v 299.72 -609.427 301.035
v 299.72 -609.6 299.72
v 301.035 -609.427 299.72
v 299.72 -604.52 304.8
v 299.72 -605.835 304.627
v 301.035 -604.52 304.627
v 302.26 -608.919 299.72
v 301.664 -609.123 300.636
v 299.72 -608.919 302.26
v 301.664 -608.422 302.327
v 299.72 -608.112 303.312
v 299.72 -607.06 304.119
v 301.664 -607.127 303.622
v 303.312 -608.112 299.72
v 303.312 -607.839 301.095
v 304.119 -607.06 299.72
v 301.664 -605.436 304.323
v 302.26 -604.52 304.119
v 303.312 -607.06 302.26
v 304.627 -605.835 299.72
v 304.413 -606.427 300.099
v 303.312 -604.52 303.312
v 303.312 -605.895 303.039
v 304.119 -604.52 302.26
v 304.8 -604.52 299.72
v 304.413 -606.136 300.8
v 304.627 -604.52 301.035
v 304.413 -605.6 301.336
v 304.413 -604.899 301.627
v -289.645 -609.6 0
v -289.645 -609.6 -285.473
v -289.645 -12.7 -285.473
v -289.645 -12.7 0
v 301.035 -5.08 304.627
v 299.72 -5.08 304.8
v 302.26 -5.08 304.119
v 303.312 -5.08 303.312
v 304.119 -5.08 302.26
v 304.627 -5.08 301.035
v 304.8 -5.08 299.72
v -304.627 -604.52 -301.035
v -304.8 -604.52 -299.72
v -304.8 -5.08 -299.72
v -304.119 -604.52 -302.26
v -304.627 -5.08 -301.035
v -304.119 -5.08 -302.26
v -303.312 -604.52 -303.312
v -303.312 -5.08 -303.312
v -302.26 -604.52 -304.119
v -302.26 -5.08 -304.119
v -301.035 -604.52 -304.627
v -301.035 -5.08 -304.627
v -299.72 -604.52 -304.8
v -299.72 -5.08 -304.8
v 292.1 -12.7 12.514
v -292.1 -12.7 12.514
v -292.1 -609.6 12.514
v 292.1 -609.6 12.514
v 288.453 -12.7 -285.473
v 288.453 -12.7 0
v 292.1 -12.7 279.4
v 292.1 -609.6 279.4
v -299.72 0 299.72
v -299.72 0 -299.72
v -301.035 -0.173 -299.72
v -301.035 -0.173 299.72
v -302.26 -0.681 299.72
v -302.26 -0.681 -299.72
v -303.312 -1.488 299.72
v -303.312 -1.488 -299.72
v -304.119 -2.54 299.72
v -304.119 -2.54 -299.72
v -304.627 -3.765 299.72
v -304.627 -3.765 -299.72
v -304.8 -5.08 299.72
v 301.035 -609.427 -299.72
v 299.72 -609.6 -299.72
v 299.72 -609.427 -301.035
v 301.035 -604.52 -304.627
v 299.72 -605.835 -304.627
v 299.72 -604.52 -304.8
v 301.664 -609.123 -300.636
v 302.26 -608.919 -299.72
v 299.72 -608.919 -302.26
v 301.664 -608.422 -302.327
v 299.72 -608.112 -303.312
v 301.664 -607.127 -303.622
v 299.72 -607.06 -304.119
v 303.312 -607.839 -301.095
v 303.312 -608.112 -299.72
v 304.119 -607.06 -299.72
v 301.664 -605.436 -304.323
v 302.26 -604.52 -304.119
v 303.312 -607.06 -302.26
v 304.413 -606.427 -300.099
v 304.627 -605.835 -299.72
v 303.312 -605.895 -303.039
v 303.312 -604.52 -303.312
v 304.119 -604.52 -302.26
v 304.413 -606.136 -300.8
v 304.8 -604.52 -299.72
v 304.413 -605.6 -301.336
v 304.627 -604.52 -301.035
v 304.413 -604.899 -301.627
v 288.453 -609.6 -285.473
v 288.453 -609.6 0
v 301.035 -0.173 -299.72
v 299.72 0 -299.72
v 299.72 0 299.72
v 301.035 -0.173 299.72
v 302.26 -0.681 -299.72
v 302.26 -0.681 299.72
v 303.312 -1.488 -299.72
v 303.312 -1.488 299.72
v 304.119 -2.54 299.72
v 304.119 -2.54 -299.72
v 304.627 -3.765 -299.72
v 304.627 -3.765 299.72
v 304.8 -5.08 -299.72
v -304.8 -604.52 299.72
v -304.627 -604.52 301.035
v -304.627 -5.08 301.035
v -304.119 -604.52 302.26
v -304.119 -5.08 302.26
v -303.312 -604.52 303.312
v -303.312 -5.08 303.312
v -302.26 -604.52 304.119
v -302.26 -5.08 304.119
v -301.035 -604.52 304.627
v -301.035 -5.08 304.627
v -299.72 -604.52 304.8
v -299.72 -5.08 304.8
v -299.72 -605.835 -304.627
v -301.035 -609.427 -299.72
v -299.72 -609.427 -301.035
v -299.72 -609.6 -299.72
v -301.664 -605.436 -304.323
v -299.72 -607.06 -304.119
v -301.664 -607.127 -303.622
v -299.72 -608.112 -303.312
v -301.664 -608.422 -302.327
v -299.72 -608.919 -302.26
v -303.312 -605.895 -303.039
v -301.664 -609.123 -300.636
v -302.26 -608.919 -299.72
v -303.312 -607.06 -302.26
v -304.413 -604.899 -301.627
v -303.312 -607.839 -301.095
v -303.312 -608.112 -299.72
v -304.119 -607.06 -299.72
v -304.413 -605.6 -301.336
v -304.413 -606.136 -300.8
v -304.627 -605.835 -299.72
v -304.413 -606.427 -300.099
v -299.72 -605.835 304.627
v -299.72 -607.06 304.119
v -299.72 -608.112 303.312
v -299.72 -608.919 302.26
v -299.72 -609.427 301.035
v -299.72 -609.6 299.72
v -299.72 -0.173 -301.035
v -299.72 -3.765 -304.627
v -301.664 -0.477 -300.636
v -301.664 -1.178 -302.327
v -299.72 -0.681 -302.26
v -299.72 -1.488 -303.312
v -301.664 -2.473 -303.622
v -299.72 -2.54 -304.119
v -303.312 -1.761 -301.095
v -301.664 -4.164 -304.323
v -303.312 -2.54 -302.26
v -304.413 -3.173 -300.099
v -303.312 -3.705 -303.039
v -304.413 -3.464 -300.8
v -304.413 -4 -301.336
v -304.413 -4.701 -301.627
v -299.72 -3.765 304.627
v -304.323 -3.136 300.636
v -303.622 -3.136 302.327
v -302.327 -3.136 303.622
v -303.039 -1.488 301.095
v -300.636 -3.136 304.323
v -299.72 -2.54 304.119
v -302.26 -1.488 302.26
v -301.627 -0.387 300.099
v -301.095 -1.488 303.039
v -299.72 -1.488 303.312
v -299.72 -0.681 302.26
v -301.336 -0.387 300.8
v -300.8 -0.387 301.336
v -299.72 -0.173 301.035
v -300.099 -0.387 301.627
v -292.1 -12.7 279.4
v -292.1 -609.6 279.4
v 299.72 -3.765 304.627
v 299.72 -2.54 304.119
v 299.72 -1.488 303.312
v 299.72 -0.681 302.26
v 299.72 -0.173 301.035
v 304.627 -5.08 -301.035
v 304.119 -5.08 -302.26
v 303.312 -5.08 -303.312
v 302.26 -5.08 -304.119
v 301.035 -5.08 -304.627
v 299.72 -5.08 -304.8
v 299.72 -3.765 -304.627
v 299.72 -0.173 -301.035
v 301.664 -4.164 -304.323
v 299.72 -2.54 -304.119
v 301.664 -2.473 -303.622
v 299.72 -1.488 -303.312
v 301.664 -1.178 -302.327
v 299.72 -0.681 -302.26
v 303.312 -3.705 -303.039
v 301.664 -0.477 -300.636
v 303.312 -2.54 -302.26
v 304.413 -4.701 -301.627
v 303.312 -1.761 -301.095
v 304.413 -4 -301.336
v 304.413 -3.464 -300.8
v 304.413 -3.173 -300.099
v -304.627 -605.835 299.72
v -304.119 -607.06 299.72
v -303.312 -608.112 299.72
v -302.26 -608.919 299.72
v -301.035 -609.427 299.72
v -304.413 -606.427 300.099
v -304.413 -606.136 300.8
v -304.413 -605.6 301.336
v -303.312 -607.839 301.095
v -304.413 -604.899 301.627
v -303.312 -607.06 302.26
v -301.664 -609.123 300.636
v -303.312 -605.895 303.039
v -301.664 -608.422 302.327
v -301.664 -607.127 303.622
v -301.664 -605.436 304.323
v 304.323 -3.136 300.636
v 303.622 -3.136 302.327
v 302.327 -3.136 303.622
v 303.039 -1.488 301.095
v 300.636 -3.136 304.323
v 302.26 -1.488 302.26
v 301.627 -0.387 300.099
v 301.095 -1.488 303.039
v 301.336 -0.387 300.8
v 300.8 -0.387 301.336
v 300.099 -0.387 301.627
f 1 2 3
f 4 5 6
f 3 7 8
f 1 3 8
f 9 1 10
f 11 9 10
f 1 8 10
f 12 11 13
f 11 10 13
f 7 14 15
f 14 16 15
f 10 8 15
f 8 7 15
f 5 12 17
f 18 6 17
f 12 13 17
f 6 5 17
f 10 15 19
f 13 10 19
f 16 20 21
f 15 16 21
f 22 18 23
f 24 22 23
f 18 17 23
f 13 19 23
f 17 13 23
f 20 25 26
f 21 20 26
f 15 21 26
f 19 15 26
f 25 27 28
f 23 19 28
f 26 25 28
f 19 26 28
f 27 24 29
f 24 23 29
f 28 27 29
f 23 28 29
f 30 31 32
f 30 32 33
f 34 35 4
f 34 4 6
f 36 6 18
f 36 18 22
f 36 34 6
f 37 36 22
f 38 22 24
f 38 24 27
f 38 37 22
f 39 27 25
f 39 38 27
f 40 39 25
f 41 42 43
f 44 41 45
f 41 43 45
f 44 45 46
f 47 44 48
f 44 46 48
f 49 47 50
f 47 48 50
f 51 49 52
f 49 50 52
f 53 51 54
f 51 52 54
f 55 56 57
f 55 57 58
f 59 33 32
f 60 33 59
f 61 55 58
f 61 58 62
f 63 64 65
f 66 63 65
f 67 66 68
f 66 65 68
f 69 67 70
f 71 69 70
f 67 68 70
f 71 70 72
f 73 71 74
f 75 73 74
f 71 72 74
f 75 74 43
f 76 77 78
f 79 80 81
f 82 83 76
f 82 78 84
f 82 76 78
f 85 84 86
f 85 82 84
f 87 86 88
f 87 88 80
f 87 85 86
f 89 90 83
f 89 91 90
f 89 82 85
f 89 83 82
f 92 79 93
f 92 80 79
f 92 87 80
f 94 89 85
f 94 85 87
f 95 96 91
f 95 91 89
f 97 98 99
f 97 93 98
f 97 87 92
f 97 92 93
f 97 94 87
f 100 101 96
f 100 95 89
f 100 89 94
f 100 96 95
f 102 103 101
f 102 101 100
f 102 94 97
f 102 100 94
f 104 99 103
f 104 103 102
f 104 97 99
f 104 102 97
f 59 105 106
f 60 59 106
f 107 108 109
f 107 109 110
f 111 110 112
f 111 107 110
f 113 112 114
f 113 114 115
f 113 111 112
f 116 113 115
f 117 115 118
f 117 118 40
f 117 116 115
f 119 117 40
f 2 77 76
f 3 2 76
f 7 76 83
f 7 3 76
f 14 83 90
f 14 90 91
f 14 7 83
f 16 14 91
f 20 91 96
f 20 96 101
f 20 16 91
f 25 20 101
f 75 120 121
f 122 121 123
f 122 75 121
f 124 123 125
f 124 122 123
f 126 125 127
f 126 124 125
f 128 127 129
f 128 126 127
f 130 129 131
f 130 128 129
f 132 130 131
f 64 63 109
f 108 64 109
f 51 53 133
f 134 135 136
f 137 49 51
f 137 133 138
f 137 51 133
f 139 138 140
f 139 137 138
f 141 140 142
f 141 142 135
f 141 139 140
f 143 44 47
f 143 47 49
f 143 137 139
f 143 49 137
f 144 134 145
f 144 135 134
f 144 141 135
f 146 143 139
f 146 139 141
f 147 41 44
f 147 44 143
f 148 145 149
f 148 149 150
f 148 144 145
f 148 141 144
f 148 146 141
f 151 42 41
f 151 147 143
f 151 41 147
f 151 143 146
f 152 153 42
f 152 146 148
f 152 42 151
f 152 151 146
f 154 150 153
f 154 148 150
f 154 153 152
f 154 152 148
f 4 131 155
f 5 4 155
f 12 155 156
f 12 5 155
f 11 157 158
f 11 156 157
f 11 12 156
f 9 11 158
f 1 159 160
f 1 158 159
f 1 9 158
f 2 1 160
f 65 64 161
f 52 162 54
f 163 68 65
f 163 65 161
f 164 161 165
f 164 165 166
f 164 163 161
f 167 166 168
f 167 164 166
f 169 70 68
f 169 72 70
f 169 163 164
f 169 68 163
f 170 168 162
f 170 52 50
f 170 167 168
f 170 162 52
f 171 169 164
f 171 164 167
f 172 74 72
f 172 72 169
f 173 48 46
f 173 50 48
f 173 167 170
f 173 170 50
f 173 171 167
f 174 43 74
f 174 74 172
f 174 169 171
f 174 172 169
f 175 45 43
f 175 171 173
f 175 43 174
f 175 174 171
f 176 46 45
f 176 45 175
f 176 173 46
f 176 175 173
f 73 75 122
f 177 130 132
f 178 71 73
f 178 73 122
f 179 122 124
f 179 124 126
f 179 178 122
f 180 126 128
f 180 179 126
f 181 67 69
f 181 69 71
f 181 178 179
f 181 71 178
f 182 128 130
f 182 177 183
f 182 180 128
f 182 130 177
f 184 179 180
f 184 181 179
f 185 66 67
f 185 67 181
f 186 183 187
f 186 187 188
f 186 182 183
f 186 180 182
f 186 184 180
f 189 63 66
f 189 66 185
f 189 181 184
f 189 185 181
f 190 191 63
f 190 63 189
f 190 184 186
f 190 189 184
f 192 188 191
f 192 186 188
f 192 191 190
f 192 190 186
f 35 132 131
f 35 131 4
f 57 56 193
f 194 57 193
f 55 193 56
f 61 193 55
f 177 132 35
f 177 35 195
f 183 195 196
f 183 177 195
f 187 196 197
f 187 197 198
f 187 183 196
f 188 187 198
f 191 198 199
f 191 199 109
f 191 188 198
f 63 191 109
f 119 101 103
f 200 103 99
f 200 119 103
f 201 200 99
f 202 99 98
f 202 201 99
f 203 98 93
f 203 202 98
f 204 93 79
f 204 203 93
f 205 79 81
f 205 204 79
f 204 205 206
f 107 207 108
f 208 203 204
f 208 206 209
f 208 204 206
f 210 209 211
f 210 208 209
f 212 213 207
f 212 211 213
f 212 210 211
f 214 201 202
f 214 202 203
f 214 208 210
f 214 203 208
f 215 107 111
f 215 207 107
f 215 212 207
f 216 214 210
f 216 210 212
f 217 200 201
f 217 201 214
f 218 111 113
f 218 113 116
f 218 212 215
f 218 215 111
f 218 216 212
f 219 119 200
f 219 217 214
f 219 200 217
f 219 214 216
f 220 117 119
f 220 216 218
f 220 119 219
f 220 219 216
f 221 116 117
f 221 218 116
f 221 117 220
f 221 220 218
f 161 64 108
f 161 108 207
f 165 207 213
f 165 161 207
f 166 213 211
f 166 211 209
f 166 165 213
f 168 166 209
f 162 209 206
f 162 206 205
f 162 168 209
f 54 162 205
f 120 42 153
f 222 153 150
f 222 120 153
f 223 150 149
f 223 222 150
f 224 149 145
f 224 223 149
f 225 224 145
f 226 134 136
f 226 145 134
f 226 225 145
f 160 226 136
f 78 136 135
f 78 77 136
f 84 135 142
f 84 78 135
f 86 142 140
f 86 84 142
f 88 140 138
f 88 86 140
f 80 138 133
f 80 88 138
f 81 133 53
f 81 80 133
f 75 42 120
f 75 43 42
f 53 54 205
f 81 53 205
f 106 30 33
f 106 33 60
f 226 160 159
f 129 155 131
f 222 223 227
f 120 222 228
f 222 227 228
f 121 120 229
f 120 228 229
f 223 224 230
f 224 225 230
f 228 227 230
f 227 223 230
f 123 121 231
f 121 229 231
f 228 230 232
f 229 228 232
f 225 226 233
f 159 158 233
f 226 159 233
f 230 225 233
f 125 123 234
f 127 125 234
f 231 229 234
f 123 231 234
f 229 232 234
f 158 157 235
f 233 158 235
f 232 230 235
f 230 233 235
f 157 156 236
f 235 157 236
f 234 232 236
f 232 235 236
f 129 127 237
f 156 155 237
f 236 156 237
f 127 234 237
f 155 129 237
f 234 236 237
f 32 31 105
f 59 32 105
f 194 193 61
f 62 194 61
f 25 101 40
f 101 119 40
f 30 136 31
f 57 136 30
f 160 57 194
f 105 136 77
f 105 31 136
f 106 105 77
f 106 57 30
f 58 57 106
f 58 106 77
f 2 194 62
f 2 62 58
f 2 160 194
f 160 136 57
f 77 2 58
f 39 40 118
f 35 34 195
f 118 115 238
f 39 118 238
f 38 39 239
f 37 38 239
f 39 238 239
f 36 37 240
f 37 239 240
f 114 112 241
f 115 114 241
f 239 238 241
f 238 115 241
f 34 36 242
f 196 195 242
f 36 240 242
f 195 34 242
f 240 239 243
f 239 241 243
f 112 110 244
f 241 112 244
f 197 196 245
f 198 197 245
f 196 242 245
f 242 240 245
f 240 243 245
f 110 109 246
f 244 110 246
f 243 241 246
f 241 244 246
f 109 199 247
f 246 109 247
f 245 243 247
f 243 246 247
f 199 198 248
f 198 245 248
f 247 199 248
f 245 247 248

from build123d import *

# Parameters (mm, degrees)
F0_W         = 609.6
F0_H         = 609.6
F1_DEPTH     = 609.6
F3_R         = 5.08
F4_R         = 5.08
F5_T1_DEPTH  = 599.44
F5_T3_DEPTH  = 599.44
F5_T5_DEPTH  = 599.44
F5_S9_W      = 5.08
F5_S9_H      = 5.08
F5_T10_DEPTH = 5.08
F5_S15_W     = 5.08
F5_S15_H     = 5.08
F5_T16_DEPTH = 5.08
F5_S21_W     = 5.08
F5_S21_H     = 5.08
F5_T22_DEPTH = 5.08
F5_S27_W     = 5.08
F5_S27_H     = 5.08
F5_T28_DEPTH = 5.08
F5_T32_ANGLE = 90
F5_T34_ANGLE = 90
F2_W         = 584.2
F2_H         = 266.8860325682
F6_DEPTH     = 596.9
F7_W         = 578.0983269215
F7_H         = 285.4733169079
F8_DEPTH     = 596.9


# Not quite as in the source:
# - a fillet or chamfer that OpenCascade refuses, or shapes differently, is made with other operations: its cross-section is extruded or revolved along the edge and cut away or added


with BuildPart() as f1:
    # F0 (on Front) → F1 (new body)
    with BuildSketch(Plane.XZ):
        Rectangle(F0_W, F0_H)
    extrude(amount=F1_DEPTH)

    # F3
    f3_edges = [f1.edges().sort_by_distance(p)[0] for p in [
        (0, -609.6, 304.8),
    ]]
    fillet(f3_edges, radius=F3_R)

    # F4
    f4_edges = [f1.edges().sort_by_distance(p)[0] for p in [
        (-304.8, -609.6, -2.54),
        (304.8, -609.6, -2.54),
        (0, -609.6, -304.8),
    ]]
    fillet(f4_edges, radius=F4_R)

    # F5: fillet of radius 5.08 on 7 edges, made by hand

    # F5_s2 → F5_t1 (cut)
    with BuildSketch(Plane.XZ.offset(5.08)):
        with BuildLine():
            ThreePointArc((304.8, -299.72), (303.3121024484, -303.3121024484), (299.72, -304.8))
            Line((299.72, -304.8), (304.8, -304.8))
            Line((304.8, -304.8), (304.8, -299.72))
        make_face()
        with BuildLine():
            ThreePointArc((-304.8, -299.72), (-303.3121024484, -303.3121024484), (-299.72, -304.8))
            Line((-299.72, -304.8), (-304.8, -304.8))
            Line((-304.8, -304.8), (-304.8, -299.72))
        make_face()
    extrude(amount=F5_T1_DEPTH, mode=Mode.SUBTRACT)

    # F5_s4 → F5_t3 (cut)
    with BuildSketch(Plane.XY.offset(-299.72)):
        with BuildLine():
            ThreePointArc((299.72, 0), (303.3121024484, -1.4878975516), (304.8, -5.08))
            Line((304.8, -5.08), (304.8, 0))
            Line((304.8, 0), (299.72, 0))
        make_face()
        with BuildLine():
            ThreePointArc((-299.72, 0), (-303.3121024484, -1.4878975516), (-304.8, -5.08))
            Line((-304.8, -5.08), (-304.8, 0))
            Line((-304.8, 0), (-299.72, 0))
        make_face()
    extrude(amount=F5_T3_DEPTH, mode=Mode.SUBTRACT)

    # F5_s6 → F5_t5 (cut)
    with BuildSketch(Plane.YZ.offset(-299.72)):
        with BuildLine():
            ThreePointArc((-5.08, 304.8), (-1.4878975516, 303.3121024484), (0, 299.72))
            Line((0, 299.72), (0, 304.8))
            Line((0, 304.8), (-5.08, 304.8))
        make_face()
        with BuildLine():
            ThreePointArc((0, -299.72), (-1.4878975516, -303.3121024484), (-5.08, -304.8))
            Line((-5.08, -304.8), (0, -304.8))
            Line((0, -304.8), (0, -299.72))
        make_face()
    extrude(amount=F5_T5_DEPTH, mode=Mode.SUBTRACT)


with BuildPart() as f5_tool8:
    # F5_s9 → F5_t10 (new body)
    with BuildSketch(Plane.YZ.offset(-299.72)):
        with Locations((-607.06, -302.26)):
            Rectangle(F5_S9_W, F5_S9_H)
    extrude(amount=-F5_T10_DEPTH)

    # F5_s11 → F5_t12 (revolve, cut)
    with BuildSketch(Plane(origin=(-299.72, -604.52, -299.72), x_dir=(0, 0.7071067812, 0.7071067812), z_dir=(0, -0.7071067812, 0.7071067812))):
        with BuildLine():
            ThreePointArc((0, -5.08), (5.08, 0), (0, 5.08))
            Line((0, 5.08), (0, -5.08))
        make_face()
    revolve(axis=Axis((-299.72, -604.52, -299.72), (-1, 0, 0)), mode=Mode.SUBTRACT)


with BuildPart() as f1_1:
    add(f1.part)

    # F5_t7: cut F5_tool8
    add(f5_tool8.part, mode=Mode.SUBTRACT)


with BuildPart() as f5_tool14:
    # F5_s15 → F5_t16 (new body)
    with BuildSketch(Plane.YZ.offset(299.72)):
        with Locations((-607.06, -302.26)):
            Rectangle(F5_S15_W, F5_S15_H)
    extrude(amount=F5_T16_DEPTH)

    # F5_s17 → F5_t18 (revolve, cut)
    with BuildSketch(Plane(origin=(299.72, -604.52, -299.72), x_dir=(0, 0.7071067812, 0.7071067812), z_dir=(0, 0.7071067812, -0.7071067812))):
        with BuildLine():
            ThreePointArc((0, -5.08), (5.08, 0), (0, 5.08))
            Line((0, 5.08), (0, -5.08))
        make_face()
    revolve(axis=Axis((299.72, -604.52, -299.72), (1, 0, 0)), mode=Mode.SUBTRACT)


with BuildPart() as f1_2:
    add(f1_1.part)

    # F5_t13: cut F5_tool14
    add(f5_tool14.part, mode=Mode.SUBTRACT)


with BuildPart() as f5_tool20:
    # F5_s21 → F5_t22 (new body)
    with BuildSketch(Plane.YZ.offset(299.72)):
        with Locations((-2.54, -302.26)):
            Rectangle(F5_S21_W, F5_S21_H)
    extrude(amount=F5_T22_DEPTH)

    # F5_s23 → F5_t24 (revolve, cut)
    with BuildSketch(Plane(origin=(299.72, -5.08, -299.72), x_dir=(0, -0.7071067812, 0.7071067812), z_dir=(0, 0.7071067812, 0.7071067812))):
        with BuildLine():
            ThreePointArc((0, -5.08), (5.08, 0), (0, 5.08))
            Line((0, 5.08), (0, -5.08))
        make_face()
    revolve(axis=Axis((299.72, -5.08, -299.72), (1, 0, 0)), mode=Mode.SUBTRACT)


with BuildPart() as f1_3:
    add(f1_2.part)

    # F5_t19: cut F5_tool20
    add(f5_tool20.part, mode=Mode.SUBTRACT)


with BuildPart() as f5_tool26:
    # F5_s27 → F5_t28 (new body)
    with BuildSketch(Plane.YZ.offset(-299.72)):
        with Locations((-2.54, -302.26)):
            Rectangle(F5_S27_W, F5_S27_H)
    extrude(amount=-F5_T28_DEPTH)

    # F5_s29 → F5_t30 (revolve, cut)
    with BuildSketch(Plane(origin=(-299.72, -5.08, -299.72), x_dir=(0, -0.7071067812, 0.7071067812), z_dir=(0, -0.7071067812, -0.7071067812))):
        with BuildLine():
            ThreePointArc((0, -5.08), (5.08, 0), (0, 5.08))
            Line((0, 5.08), (0, -5.08))
        make_face()
    revolve(axis=Axis((-299.72, -5.08, -299.72), (-1, 0, 0)), mode=Mode.SUBTRACT)


with BuildPart() as f1_4:
    add(f1_3.part)

    # F5_t25: cut F5_tool26
    add(f5_tool26.part, mode=Mode.SUBTRACT)

    # F5_s31 → F5_t32 (revolve, cut)
    with BuildSketch(Plane.XY.offset(299.72)):
        with BuildLine():
            ThreePointArc((-304.8, -5.08), (-303.3121024484, -1.4878975516), (-299.72, 0))
            Line((-299.72, 0), (-304.8, 0))
            Line((-304.8, 0), (-304.8, -5.08))
        make_face()
    revolve(axis=Axis((-299.72, 0, 299.72), (0, 1, 0)), revolution_arc=F5_T32_ANGLE, mode=Mode.SUBTRACT)

    # F5_s33 → F5_t34 (revolve, cut)
    with BuildSketch(Plane.XY.offset(299.72)):
        with BuildLine():
            ThreePointArc((304.8, -5.08), (303.3121024484, -1.4878975516), (299.72, 0))
            Line((299.72, 0), (304.8, 0))
            Line((304.8, 0), (304.8, -5.08))
        make_face()
    revolve(axis=Axis((299.72, 0, 299.72), (0, -1, 0)), revolution_arc=F5_T34_ANGLE, mode=Mode.SUBTRACT)

    # F2 (on face) → F6 (cut)
    with BuildSketch(Plane.XZ.offset(609.6)):
        with Locations((0, 145.9569837159)):
            Rectangle(F2_W, F2_H)
    extrude(amount=-F6_DEPTH, mode=Mode.SUBTRACT)

    # F7 (on face) → F8 (cut)
    with BuildSketch(Plane.XZ.offset(609.6)):
        with Locations((-0.5959719419, -142.7366584539)):
            Rectangle(F7_W, F7_H)
    extrude(amount=-F8_DEPTH, mode=Mode.SUBTRACT)


solid = f1_4.part
